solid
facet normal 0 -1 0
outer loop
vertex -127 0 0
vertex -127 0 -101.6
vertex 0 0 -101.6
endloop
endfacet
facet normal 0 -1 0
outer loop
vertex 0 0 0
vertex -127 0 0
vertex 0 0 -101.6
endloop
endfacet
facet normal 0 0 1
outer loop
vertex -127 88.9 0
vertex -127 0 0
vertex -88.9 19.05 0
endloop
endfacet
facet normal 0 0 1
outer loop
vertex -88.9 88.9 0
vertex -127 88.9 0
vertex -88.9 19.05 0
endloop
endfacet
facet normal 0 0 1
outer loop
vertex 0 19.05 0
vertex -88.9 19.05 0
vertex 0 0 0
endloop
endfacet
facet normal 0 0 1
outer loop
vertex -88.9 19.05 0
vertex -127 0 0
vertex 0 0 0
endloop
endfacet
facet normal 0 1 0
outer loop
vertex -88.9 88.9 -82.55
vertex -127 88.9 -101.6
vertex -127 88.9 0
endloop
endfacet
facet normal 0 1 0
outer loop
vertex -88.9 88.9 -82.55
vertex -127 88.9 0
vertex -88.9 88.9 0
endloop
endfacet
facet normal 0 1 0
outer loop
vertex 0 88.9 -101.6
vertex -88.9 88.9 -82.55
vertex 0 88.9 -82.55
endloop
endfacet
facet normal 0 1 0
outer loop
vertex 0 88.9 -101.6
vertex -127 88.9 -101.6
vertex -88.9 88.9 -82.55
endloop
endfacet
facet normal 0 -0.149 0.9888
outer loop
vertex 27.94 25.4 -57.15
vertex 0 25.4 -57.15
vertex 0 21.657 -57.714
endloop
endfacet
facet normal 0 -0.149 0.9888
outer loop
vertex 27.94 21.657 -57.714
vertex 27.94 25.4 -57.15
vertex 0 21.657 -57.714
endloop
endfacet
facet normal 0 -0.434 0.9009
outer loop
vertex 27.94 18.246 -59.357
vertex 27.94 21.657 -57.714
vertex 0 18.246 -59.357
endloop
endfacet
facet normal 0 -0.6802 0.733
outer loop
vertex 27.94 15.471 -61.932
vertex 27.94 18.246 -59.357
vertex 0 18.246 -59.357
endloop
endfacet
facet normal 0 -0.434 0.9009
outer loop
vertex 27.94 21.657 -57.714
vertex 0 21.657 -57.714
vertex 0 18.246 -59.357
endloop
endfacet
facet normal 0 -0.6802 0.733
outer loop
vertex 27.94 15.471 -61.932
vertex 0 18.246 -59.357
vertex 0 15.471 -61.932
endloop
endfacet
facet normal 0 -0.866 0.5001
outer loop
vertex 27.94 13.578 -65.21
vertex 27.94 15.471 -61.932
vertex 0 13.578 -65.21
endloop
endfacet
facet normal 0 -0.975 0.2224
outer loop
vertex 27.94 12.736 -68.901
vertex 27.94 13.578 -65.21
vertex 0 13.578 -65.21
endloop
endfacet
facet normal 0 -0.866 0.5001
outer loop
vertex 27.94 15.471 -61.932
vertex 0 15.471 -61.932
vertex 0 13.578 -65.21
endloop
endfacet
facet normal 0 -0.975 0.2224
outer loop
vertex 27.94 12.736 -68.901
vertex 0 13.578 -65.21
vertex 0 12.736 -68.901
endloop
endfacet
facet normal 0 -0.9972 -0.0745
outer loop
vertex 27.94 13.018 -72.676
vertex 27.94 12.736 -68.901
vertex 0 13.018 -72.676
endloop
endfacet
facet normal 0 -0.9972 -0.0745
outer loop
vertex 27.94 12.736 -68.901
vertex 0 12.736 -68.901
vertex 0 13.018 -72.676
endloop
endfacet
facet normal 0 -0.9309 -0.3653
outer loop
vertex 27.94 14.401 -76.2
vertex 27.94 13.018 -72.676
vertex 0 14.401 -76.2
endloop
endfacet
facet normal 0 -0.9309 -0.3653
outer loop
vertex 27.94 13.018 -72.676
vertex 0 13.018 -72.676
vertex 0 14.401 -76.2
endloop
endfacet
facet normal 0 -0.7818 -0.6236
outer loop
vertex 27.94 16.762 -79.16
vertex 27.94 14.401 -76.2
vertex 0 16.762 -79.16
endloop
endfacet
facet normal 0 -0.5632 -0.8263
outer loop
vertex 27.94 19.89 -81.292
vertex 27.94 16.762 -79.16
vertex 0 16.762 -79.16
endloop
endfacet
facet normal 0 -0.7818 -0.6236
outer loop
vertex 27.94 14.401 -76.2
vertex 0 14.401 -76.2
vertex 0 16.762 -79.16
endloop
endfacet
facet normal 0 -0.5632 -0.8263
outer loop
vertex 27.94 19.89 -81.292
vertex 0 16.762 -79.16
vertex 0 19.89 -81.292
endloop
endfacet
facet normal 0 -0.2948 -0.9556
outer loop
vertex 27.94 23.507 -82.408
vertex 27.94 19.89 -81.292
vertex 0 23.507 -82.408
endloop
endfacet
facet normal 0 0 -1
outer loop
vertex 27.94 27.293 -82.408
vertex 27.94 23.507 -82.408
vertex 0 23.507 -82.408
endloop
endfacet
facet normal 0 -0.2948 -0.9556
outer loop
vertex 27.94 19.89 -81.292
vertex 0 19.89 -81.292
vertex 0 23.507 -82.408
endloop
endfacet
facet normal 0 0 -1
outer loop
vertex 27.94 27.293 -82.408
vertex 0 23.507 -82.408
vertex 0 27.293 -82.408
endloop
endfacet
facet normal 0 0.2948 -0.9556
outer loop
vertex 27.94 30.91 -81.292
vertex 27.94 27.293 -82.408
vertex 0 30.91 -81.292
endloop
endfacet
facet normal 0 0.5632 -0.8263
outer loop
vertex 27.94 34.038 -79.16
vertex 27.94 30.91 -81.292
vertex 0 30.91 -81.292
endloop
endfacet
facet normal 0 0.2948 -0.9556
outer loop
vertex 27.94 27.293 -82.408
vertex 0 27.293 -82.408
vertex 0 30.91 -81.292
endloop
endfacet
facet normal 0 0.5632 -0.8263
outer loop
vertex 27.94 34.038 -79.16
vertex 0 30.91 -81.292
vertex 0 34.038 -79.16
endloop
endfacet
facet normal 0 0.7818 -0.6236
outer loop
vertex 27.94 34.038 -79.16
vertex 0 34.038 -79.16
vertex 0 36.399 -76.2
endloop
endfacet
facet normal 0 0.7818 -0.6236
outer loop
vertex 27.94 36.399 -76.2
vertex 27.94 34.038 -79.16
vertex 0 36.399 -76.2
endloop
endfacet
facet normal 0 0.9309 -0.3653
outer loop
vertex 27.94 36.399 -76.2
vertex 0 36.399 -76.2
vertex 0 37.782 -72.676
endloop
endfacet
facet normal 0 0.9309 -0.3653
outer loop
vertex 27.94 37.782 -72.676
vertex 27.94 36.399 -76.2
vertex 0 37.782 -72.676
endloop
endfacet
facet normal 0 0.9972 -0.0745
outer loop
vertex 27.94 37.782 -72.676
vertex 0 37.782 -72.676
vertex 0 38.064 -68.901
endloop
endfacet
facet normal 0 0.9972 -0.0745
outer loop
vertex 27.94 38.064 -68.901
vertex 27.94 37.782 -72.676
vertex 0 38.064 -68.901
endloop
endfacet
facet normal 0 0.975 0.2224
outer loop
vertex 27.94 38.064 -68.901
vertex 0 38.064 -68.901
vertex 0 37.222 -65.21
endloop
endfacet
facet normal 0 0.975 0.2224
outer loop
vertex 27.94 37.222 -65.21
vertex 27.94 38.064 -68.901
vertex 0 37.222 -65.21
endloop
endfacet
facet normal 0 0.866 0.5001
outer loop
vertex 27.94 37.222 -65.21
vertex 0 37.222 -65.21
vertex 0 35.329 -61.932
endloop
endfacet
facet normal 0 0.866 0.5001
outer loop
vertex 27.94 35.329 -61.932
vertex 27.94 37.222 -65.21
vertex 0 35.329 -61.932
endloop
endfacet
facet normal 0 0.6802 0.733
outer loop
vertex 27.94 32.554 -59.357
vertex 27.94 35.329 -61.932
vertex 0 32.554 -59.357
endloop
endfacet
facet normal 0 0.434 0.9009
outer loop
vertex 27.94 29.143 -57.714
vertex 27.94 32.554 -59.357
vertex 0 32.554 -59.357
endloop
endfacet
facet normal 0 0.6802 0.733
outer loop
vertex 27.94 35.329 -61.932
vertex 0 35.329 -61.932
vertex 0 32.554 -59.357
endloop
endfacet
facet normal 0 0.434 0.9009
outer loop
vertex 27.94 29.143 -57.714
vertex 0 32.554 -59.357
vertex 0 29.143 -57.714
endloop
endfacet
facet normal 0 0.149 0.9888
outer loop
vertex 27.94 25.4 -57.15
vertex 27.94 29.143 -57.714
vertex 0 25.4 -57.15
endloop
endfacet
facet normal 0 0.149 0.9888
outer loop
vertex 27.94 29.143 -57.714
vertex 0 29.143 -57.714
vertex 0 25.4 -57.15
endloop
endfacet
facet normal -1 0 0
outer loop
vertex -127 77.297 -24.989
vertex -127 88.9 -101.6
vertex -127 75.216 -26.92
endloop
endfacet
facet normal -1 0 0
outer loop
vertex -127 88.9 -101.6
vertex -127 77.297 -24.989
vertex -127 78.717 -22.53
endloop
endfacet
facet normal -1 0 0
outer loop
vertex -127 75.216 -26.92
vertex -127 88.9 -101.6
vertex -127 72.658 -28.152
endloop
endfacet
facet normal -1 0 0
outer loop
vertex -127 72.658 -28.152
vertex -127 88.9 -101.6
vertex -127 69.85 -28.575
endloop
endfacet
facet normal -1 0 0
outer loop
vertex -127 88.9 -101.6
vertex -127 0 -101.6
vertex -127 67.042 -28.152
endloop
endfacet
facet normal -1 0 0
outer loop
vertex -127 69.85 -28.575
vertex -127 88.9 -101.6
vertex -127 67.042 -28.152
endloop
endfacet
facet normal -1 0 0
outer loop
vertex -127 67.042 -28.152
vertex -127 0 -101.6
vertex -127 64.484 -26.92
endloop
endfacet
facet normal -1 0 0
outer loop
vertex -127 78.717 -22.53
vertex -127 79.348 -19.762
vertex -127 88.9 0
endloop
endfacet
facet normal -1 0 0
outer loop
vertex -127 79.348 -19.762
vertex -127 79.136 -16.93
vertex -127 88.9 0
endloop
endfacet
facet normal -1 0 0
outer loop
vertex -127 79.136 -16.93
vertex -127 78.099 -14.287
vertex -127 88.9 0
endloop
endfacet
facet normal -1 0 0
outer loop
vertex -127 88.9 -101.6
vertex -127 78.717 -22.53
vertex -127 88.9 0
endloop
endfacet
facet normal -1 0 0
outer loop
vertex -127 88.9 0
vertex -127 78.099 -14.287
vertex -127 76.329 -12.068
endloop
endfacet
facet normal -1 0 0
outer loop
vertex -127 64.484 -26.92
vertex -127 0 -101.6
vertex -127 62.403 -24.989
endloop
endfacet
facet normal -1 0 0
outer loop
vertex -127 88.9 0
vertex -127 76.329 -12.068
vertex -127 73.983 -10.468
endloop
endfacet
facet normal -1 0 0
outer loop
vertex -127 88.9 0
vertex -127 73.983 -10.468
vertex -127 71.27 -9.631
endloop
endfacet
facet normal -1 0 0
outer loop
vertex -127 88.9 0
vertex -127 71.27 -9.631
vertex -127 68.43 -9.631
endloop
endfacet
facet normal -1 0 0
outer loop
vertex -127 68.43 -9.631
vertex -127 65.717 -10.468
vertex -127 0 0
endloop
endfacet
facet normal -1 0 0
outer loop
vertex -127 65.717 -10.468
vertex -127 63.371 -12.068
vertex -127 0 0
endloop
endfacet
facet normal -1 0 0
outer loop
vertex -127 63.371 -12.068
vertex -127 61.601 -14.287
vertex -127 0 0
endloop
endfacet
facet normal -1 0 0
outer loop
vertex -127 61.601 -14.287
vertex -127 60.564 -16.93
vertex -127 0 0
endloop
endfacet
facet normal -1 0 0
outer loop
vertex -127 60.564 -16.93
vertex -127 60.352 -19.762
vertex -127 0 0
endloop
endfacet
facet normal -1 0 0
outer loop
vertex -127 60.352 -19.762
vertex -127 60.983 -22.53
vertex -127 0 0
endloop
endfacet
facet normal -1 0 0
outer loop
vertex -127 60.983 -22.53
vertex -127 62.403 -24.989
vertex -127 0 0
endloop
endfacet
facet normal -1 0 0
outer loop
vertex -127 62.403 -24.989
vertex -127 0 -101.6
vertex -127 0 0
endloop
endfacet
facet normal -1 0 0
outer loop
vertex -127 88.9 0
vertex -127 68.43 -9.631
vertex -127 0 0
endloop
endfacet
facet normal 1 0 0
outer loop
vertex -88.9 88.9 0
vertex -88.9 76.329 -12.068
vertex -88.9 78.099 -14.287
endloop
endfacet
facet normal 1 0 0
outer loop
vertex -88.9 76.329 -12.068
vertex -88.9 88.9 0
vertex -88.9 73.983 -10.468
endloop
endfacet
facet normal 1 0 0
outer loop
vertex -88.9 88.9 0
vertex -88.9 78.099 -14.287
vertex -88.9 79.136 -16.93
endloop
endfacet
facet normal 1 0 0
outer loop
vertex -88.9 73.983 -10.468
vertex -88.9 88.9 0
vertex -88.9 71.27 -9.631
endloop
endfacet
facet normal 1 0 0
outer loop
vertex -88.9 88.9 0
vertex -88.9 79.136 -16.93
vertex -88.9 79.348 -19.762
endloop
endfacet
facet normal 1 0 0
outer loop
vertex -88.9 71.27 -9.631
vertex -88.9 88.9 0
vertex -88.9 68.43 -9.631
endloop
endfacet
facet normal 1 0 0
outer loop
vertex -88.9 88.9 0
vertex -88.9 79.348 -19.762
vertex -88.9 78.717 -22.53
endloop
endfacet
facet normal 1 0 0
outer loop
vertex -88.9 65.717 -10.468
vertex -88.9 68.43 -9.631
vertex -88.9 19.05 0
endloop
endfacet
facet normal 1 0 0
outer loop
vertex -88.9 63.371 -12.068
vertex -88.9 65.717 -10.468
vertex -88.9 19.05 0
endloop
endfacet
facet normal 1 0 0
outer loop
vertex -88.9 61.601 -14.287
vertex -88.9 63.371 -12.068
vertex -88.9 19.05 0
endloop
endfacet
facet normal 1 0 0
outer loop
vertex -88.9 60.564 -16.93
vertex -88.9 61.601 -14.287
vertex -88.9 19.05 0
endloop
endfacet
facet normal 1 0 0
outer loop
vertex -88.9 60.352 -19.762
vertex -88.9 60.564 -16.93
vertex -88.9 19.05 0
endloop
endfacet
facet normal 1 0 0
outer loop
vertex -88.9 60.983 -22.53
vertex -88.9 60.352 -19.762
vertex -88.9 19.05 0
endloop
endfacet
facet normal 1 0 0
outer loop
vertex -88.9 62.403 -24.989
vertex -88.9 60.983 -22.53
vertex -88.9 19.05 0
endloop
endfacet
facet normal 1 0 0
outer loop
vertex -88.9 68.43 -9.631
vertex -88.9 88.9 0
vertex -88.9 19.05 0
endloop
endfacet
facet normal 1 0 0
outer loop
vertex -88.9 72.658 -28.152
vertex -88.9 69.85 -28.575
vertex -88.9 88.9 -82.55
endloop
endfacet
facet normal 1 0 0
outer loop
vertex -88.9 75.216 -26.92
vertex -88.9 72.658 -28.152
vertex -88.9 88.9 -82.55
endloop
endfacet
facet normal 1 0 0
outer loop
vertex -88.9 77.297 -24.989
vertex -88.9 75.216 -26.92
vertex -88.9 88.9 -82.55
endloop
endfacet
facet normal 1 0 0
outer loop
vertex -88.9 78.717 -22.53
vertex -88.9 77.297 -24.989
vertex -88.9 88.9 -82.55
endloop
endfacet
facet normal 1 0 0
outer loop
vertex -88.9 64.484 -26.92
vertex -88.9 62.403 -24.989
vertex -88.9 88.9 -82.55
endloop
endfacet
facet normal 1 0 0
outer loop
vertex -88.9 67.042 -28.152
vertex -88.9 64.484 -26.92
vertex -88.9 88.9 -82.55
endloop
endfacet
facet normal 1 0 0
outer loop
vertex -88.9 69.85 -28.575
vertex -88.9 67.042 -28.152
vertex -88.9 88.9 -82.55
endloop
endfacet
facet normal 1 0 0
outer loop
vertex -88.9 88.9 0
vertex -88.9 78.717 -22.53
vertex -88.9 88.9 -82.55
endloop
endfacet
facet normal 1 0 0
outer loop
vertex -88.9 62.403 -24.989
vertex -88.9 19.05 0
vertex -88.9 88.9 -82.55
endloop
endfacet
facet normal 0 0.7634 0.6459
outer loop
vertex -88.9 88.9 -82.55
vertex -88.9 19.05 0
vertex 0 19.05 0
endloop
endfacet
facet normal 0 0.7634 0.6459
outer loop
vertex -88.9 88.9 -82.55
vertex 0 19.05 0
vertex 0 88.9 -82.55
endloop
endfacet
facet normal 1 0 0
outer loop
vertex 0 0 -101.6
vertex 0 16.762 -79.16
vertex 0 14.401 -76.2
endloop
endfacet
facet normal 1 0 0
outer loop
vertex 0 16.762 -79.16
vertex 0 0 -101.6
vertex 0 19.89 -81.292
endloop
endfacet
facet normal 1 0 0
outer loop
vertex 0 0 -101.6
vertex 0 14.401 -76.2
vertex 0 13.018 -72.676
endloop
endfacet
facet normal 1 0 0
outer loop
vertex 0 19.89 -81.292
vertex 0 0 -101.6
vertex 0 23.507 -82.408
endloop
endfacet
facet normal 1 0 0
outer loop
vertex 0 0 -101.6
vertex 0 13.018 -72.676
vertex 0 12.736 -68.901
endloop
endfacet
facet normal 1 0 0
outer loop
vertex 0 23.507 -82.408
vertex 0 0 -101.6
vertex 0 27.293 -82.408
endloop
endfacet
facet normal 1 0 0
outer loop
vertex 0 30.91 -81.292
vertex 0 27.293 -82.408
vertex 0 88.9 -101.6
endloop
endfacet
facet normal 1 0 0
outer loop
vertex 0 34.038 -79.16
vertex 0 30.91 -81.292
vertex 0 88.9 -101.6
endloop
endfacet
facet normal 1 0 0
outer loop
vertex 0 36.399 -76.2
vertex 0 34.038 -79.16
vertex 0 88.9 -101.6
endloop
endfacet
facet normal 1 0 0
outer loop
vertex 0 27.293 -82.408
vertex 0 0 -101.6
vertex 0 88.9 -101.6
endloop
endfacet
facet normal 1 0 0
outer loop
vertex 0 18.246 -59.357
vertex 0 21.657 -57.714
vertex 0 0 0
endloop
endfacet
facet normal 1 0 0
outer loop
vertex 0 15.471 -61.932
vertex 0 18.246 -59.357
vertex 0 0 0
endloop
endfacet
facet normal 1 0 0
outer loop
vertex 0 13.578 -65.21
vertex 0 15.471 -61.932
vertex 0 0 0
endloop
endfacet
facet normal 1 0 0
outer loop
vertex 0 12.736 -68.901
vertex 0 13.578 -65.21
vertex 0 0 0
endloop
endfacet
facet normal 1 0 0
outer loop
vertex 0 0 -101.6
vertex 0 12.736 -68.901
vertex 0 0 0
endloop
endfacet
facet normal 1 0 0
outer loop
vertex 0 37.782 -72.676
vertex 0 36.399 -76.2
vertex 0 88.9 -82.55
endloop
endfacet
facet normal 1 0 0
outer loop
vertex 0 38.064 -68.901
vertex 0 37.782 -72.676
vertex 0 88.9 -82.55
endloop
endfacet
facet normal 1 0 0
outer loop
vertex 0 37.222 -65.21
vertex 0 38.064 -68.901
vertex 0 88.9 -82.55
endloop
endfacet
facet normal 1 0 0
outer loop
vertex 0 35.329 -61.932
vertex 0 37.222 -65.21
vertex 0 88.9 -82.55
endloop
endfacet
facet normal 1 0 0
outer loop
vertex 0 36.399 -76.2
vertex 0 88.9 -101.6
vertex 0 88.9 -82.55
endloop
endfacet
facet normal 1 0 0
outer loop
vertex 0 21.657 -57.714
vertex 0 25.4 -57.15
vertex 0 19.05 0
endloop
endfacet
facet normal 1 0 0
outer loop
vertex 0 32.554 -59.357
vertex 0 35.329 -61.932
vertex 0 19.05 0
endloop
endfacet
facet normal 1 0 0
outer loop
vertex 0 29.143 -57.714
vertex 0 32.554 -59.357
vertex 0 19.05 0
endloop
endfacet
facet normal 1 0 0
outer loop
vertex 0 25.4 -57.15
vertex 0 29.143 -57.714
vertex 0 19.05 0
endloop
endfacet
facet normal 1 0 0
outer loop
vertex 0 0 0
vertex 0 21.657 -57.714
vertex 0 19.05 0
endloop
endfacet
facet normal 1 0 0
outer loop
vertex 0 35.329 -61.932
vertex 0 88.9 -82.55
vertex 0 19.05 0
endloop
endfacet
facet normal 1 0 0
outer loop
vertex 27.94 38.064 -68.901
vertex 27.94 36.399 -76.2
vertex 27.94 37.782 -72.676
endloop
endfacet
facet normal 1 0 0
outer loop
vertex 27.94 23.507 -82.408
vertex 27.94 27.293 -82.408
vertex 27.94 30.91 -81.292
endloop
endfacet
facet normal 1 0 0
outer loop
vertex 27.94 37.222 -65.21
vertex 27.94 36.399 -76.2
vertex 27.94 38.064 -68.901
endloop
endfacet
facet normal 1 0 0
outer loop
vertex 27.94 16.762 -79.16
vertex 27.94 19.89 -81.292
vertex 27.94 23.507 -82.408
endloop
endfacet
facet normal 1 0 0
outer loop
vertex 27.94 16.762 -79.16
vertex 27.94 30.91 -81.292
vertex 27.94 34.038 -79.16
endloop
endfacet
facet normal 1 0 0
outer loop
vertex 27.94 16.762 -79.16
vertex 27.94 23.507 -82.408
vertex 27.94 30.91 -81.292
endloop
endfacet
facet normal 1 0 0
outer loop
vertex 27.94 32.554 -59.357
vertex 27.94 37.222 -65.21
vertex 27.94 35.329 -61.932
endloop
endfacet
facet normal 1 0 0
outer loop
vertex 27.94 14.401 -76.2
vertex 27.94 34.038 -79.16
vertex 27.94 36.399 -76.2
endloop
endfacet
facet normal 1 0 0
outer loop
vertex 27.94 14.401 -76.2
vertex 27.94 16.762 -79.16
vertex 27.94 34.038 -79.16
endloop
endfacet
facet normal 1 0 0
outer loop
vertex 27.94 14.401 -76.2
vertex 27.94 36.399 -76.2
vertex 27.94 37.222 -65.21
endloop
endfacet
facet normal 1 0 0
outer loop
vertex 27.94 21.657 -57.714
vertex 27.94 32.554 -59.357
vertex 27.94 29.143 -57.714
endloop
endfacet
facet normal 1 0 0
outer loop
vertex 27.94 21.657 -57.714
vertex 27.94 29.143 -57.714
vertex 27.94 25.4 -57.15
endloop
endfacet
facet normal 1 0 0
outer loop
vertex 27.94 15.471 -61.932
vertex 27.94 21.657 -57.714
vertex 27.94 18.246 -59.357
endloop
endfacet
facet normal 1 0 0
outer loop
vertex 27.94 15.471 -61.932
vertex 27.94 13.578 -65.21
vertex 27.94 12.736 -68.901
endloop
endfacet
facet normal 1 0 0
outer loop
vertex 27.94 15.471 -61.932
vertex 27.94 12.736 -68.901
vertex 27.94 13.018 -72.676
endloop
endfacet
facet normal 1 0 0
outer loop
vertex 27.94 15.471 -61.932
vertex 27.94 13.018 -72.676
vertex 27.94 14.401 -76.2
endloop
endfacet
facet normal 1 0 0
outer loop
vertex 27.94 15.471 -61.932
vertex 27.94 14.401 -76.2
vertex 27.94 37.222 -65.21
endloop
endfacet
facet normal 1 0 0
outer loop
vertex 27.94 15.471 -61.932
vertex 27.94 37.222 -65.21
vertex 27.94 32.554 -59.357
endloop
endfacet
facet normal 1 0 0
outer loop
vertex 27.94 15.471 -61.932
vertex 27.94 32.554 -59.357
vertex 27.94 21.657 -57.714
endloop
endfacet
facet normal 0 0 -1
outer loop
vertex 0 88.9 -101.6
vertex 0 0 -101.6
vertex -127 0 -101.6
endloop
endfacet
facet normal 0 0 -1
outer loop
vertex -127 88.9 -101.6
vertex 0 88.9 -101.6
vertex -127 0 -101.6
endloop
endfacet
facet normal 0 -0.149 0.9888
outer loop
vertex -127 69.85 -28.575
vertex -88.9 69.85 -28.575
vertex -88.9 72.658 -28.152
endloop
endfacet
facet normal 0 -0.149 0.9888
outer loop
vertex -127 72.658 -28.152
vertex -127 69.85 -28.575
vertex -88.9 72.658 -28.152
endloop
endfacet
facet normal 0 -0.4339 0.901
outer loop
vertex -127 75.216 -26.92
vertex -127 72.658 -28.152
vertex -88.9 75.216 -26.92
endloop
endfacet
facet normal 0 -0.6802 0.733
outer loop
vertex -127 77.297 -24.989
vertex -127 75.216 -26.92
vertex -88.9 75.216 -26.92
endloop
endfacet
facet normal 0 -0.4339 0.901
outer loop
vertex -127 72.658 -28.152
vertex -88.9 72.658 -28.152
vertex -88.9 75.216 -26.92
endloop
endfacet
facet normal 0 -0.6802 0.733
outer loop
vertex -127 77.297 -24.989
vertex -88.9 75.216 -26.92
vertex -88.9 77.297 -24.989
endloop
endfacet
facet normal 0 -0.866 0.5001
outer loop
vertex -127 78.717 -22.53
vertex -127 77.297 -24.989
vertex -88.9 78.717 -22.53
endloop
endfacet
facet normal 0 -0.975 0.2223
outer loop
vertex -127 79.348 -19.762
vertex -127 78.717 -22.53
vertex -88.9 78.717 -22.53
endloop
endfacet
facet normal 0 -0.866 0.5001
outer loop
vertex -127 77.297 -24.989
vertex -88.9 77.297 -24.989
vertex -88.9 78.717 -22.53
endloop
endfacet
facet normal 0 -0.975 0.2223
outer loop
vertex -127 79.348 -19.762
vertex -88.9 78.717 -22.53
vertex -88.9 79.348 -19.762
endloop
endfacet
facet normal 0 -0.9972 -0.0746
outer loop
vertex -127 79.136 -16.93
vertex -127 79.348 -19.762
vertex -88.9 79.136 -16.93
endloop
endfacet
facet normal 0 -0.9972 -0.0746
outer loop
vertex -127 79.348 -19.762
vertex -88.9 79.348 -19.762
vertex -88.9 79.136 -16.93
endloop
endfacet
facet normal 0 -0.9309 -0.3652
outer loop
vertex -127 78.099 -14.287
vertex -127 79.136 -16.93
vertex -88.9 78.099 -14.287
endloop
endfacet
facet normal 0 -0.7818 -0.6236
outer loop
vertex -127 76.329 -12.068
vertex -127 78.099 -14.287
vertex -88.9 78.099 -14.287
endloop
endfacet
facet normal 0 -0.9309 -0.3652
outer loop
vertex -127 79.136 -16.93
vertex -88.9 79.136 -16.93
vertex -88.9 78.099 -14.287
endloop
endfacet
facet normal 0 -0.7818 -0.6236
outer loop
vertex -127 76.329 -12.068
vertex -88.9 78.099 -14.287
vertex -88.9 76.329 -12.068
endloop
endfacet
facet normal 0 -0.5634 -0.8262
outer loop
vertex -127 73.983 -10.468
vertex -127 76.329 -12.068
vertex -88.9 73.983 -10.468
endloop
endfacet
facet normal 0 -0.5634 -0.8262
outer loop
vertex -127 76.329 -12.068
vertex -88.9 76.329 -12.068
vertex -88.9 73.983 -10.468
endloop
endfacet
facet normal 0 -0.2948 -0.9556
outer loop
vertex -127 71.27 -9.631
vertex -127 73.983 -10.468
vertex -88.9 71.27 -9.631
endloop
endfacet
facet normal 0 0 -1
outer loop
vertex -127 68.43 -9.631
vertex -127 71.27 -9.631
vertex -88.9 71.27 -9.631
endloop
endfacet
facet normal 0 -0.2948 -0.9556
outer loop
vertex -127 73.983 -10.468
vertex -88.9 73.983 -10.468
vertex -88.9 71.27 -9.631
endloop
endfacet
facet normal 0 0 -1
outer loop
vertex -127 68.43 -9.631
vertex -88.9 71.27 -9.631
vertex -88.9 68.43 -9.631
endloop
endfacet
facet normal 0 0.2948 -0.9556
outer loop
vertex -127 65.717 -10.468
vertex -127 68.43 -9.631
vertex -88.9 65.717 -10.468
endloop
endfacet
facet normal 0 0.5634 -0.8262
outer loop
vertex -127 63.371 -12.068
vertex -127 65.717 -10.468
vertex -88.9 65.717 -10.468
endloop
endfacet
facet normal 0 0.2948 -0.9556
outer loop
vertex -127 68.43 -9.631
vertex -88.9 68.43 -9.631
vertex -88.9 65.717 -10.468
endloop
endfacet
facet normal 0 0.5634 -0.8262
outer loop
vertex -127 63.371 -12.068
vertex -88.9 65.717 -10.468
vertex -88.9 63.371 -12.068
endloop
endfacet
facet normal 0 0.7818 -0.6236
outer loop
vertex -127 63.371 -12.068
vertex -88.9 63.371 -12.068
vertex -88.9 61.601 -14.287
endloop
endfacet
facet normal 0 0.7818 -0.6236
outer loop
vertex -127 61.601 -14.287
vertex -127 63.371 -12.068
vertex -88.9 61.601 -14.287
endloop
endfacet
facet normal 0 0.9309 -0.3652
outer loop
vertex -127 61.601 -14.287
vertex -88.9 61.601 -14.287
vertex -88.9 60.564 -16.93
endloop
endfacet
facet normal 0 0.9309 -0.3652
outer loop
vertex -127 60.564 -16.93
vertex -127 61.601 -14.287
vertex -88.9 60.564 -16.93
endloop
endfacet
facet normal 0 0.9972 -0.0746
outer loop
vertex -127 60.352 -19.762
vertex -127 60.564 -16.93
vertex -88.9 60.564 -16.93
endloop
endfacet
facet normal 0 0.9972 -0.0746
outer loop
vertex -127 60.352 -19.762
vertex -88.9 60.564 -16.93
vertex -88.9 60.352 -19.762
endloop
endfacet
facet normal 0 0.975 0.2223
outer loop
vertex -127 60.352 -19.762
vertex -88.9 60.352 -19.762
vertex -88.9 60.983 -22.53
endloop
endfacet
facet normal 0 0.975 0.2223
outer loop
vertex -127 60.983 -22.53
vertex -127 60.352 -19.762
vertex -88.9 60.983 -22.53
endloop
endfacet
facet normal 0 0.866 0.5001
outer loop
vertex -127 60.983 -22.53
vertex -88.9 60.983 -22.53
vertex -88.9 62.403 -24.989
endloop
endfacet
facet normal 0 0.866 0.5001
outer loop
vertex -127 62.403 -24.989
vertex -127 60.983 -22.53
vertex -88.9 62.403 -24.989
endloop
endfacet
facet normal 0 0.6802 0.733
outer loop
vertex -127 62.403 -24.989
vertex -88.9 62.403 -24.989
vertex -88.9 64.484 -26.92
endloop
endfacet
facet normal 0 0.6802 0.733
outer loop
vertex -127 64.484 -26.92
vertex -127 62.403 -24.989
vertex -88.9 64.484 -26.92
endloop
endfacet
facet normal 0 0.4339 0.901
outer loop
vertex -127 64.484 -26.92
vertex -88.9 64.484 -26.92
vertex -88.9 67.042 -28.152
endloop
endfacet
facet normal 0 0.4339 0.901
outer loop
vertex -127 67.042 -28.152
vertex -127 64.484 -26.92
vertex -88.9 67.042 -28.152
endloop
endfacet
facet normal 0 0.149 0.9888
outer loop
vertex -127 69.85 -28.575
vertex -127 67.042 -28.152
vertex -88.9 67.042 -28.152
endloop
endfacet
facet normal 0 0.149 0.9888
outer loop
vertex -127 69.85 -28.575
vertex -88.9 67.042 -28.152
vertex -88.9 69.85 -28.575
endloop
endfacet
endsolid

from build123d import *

# Parameters (mm, degrees)
SKETCH1_W           = 88.9
SKETCH1_H           = 82.55
BOSS_EXTRUDE1_DEPTH = 19.05
BOSS_EXTRUDE2_DEPTH = 88.9
BOSS_EXTRUDE3_DEPTH = 88.9
SKETCH5_R           = 9.525
CUT_EXTRUDE1_DEPTH  = 88.9
SKETCH6_R           = 12.7
BOSS_EXTRUDE4_DEPTH = 27.94


with BuildPart() as part:
    # Sketch1 → Boss-Extrude1 (new body)
    with BuildSketch(Plane(origin=(0, 0, 0), x_dir=(1, 0, 0), z_dir=(0, 1, 0))):
        with Locations((-44.45, 41.275)):
            Rectangle(SKETCH1_W, SKETCH1_H)
    extrude(amount=BOSS_EXTRUDE1_DEPTH)

    # Sketch1<3> → Boss-Extrude2 (add)
    with BuildSketch(Plane(origin=(0, 0, 0), x_dir=(1, 0, 0), z_dir=(0, 1, 0))):
        Polygon((-88.9, 82.55), (0, 82.55), (0, 101.6), (-127, 101.6), (-127, 82.55), (-127, 0), (-88.9, 0), align=None)
    extrude(amount=BOSS_EXTRUDE2_DEPTH)

    # Sketch2 → Boss-Extrude3 (add)
    with BuildSketch(Plane(origin=(-88.9, 0, 0), x_dir=(0, 0, -1), z_dir=(1, 0, 0))):
        Polygon((0, 19.05), (82.55, 88.9), (82.55, 19.05), align=None)
    extrude(amount=BOSS_EXTRUDE3_DEPTH)

    # Sketch5 → Cut-Extrude1 (cut)
    with BuildSketch(Plane(origin=(-88.9, 0, 0), x_dir=(0, 0, -1), z_dir=(1, 0, 0))):
        with Locations((19.05, 69.85)):
            Circle(SKETCH5_R)
    extrude(amount=-CUT_EXTRUDE1_DEPTH, mode=Mode.SUBTRACT)

    # Sketch6 → Boss-Extrude4 (add)
    with BuildSketch(Plane(origin=(0, 0, 0), x_dir=(0, 0, -1), z_dir=(1, 0, 0))):
        with Locations((69.85, 25.4)):
            Circle(SKETCH6_R)
    extrude(amount=BOSS_EXTRUDE4_DEPTH)


solid = part.part
